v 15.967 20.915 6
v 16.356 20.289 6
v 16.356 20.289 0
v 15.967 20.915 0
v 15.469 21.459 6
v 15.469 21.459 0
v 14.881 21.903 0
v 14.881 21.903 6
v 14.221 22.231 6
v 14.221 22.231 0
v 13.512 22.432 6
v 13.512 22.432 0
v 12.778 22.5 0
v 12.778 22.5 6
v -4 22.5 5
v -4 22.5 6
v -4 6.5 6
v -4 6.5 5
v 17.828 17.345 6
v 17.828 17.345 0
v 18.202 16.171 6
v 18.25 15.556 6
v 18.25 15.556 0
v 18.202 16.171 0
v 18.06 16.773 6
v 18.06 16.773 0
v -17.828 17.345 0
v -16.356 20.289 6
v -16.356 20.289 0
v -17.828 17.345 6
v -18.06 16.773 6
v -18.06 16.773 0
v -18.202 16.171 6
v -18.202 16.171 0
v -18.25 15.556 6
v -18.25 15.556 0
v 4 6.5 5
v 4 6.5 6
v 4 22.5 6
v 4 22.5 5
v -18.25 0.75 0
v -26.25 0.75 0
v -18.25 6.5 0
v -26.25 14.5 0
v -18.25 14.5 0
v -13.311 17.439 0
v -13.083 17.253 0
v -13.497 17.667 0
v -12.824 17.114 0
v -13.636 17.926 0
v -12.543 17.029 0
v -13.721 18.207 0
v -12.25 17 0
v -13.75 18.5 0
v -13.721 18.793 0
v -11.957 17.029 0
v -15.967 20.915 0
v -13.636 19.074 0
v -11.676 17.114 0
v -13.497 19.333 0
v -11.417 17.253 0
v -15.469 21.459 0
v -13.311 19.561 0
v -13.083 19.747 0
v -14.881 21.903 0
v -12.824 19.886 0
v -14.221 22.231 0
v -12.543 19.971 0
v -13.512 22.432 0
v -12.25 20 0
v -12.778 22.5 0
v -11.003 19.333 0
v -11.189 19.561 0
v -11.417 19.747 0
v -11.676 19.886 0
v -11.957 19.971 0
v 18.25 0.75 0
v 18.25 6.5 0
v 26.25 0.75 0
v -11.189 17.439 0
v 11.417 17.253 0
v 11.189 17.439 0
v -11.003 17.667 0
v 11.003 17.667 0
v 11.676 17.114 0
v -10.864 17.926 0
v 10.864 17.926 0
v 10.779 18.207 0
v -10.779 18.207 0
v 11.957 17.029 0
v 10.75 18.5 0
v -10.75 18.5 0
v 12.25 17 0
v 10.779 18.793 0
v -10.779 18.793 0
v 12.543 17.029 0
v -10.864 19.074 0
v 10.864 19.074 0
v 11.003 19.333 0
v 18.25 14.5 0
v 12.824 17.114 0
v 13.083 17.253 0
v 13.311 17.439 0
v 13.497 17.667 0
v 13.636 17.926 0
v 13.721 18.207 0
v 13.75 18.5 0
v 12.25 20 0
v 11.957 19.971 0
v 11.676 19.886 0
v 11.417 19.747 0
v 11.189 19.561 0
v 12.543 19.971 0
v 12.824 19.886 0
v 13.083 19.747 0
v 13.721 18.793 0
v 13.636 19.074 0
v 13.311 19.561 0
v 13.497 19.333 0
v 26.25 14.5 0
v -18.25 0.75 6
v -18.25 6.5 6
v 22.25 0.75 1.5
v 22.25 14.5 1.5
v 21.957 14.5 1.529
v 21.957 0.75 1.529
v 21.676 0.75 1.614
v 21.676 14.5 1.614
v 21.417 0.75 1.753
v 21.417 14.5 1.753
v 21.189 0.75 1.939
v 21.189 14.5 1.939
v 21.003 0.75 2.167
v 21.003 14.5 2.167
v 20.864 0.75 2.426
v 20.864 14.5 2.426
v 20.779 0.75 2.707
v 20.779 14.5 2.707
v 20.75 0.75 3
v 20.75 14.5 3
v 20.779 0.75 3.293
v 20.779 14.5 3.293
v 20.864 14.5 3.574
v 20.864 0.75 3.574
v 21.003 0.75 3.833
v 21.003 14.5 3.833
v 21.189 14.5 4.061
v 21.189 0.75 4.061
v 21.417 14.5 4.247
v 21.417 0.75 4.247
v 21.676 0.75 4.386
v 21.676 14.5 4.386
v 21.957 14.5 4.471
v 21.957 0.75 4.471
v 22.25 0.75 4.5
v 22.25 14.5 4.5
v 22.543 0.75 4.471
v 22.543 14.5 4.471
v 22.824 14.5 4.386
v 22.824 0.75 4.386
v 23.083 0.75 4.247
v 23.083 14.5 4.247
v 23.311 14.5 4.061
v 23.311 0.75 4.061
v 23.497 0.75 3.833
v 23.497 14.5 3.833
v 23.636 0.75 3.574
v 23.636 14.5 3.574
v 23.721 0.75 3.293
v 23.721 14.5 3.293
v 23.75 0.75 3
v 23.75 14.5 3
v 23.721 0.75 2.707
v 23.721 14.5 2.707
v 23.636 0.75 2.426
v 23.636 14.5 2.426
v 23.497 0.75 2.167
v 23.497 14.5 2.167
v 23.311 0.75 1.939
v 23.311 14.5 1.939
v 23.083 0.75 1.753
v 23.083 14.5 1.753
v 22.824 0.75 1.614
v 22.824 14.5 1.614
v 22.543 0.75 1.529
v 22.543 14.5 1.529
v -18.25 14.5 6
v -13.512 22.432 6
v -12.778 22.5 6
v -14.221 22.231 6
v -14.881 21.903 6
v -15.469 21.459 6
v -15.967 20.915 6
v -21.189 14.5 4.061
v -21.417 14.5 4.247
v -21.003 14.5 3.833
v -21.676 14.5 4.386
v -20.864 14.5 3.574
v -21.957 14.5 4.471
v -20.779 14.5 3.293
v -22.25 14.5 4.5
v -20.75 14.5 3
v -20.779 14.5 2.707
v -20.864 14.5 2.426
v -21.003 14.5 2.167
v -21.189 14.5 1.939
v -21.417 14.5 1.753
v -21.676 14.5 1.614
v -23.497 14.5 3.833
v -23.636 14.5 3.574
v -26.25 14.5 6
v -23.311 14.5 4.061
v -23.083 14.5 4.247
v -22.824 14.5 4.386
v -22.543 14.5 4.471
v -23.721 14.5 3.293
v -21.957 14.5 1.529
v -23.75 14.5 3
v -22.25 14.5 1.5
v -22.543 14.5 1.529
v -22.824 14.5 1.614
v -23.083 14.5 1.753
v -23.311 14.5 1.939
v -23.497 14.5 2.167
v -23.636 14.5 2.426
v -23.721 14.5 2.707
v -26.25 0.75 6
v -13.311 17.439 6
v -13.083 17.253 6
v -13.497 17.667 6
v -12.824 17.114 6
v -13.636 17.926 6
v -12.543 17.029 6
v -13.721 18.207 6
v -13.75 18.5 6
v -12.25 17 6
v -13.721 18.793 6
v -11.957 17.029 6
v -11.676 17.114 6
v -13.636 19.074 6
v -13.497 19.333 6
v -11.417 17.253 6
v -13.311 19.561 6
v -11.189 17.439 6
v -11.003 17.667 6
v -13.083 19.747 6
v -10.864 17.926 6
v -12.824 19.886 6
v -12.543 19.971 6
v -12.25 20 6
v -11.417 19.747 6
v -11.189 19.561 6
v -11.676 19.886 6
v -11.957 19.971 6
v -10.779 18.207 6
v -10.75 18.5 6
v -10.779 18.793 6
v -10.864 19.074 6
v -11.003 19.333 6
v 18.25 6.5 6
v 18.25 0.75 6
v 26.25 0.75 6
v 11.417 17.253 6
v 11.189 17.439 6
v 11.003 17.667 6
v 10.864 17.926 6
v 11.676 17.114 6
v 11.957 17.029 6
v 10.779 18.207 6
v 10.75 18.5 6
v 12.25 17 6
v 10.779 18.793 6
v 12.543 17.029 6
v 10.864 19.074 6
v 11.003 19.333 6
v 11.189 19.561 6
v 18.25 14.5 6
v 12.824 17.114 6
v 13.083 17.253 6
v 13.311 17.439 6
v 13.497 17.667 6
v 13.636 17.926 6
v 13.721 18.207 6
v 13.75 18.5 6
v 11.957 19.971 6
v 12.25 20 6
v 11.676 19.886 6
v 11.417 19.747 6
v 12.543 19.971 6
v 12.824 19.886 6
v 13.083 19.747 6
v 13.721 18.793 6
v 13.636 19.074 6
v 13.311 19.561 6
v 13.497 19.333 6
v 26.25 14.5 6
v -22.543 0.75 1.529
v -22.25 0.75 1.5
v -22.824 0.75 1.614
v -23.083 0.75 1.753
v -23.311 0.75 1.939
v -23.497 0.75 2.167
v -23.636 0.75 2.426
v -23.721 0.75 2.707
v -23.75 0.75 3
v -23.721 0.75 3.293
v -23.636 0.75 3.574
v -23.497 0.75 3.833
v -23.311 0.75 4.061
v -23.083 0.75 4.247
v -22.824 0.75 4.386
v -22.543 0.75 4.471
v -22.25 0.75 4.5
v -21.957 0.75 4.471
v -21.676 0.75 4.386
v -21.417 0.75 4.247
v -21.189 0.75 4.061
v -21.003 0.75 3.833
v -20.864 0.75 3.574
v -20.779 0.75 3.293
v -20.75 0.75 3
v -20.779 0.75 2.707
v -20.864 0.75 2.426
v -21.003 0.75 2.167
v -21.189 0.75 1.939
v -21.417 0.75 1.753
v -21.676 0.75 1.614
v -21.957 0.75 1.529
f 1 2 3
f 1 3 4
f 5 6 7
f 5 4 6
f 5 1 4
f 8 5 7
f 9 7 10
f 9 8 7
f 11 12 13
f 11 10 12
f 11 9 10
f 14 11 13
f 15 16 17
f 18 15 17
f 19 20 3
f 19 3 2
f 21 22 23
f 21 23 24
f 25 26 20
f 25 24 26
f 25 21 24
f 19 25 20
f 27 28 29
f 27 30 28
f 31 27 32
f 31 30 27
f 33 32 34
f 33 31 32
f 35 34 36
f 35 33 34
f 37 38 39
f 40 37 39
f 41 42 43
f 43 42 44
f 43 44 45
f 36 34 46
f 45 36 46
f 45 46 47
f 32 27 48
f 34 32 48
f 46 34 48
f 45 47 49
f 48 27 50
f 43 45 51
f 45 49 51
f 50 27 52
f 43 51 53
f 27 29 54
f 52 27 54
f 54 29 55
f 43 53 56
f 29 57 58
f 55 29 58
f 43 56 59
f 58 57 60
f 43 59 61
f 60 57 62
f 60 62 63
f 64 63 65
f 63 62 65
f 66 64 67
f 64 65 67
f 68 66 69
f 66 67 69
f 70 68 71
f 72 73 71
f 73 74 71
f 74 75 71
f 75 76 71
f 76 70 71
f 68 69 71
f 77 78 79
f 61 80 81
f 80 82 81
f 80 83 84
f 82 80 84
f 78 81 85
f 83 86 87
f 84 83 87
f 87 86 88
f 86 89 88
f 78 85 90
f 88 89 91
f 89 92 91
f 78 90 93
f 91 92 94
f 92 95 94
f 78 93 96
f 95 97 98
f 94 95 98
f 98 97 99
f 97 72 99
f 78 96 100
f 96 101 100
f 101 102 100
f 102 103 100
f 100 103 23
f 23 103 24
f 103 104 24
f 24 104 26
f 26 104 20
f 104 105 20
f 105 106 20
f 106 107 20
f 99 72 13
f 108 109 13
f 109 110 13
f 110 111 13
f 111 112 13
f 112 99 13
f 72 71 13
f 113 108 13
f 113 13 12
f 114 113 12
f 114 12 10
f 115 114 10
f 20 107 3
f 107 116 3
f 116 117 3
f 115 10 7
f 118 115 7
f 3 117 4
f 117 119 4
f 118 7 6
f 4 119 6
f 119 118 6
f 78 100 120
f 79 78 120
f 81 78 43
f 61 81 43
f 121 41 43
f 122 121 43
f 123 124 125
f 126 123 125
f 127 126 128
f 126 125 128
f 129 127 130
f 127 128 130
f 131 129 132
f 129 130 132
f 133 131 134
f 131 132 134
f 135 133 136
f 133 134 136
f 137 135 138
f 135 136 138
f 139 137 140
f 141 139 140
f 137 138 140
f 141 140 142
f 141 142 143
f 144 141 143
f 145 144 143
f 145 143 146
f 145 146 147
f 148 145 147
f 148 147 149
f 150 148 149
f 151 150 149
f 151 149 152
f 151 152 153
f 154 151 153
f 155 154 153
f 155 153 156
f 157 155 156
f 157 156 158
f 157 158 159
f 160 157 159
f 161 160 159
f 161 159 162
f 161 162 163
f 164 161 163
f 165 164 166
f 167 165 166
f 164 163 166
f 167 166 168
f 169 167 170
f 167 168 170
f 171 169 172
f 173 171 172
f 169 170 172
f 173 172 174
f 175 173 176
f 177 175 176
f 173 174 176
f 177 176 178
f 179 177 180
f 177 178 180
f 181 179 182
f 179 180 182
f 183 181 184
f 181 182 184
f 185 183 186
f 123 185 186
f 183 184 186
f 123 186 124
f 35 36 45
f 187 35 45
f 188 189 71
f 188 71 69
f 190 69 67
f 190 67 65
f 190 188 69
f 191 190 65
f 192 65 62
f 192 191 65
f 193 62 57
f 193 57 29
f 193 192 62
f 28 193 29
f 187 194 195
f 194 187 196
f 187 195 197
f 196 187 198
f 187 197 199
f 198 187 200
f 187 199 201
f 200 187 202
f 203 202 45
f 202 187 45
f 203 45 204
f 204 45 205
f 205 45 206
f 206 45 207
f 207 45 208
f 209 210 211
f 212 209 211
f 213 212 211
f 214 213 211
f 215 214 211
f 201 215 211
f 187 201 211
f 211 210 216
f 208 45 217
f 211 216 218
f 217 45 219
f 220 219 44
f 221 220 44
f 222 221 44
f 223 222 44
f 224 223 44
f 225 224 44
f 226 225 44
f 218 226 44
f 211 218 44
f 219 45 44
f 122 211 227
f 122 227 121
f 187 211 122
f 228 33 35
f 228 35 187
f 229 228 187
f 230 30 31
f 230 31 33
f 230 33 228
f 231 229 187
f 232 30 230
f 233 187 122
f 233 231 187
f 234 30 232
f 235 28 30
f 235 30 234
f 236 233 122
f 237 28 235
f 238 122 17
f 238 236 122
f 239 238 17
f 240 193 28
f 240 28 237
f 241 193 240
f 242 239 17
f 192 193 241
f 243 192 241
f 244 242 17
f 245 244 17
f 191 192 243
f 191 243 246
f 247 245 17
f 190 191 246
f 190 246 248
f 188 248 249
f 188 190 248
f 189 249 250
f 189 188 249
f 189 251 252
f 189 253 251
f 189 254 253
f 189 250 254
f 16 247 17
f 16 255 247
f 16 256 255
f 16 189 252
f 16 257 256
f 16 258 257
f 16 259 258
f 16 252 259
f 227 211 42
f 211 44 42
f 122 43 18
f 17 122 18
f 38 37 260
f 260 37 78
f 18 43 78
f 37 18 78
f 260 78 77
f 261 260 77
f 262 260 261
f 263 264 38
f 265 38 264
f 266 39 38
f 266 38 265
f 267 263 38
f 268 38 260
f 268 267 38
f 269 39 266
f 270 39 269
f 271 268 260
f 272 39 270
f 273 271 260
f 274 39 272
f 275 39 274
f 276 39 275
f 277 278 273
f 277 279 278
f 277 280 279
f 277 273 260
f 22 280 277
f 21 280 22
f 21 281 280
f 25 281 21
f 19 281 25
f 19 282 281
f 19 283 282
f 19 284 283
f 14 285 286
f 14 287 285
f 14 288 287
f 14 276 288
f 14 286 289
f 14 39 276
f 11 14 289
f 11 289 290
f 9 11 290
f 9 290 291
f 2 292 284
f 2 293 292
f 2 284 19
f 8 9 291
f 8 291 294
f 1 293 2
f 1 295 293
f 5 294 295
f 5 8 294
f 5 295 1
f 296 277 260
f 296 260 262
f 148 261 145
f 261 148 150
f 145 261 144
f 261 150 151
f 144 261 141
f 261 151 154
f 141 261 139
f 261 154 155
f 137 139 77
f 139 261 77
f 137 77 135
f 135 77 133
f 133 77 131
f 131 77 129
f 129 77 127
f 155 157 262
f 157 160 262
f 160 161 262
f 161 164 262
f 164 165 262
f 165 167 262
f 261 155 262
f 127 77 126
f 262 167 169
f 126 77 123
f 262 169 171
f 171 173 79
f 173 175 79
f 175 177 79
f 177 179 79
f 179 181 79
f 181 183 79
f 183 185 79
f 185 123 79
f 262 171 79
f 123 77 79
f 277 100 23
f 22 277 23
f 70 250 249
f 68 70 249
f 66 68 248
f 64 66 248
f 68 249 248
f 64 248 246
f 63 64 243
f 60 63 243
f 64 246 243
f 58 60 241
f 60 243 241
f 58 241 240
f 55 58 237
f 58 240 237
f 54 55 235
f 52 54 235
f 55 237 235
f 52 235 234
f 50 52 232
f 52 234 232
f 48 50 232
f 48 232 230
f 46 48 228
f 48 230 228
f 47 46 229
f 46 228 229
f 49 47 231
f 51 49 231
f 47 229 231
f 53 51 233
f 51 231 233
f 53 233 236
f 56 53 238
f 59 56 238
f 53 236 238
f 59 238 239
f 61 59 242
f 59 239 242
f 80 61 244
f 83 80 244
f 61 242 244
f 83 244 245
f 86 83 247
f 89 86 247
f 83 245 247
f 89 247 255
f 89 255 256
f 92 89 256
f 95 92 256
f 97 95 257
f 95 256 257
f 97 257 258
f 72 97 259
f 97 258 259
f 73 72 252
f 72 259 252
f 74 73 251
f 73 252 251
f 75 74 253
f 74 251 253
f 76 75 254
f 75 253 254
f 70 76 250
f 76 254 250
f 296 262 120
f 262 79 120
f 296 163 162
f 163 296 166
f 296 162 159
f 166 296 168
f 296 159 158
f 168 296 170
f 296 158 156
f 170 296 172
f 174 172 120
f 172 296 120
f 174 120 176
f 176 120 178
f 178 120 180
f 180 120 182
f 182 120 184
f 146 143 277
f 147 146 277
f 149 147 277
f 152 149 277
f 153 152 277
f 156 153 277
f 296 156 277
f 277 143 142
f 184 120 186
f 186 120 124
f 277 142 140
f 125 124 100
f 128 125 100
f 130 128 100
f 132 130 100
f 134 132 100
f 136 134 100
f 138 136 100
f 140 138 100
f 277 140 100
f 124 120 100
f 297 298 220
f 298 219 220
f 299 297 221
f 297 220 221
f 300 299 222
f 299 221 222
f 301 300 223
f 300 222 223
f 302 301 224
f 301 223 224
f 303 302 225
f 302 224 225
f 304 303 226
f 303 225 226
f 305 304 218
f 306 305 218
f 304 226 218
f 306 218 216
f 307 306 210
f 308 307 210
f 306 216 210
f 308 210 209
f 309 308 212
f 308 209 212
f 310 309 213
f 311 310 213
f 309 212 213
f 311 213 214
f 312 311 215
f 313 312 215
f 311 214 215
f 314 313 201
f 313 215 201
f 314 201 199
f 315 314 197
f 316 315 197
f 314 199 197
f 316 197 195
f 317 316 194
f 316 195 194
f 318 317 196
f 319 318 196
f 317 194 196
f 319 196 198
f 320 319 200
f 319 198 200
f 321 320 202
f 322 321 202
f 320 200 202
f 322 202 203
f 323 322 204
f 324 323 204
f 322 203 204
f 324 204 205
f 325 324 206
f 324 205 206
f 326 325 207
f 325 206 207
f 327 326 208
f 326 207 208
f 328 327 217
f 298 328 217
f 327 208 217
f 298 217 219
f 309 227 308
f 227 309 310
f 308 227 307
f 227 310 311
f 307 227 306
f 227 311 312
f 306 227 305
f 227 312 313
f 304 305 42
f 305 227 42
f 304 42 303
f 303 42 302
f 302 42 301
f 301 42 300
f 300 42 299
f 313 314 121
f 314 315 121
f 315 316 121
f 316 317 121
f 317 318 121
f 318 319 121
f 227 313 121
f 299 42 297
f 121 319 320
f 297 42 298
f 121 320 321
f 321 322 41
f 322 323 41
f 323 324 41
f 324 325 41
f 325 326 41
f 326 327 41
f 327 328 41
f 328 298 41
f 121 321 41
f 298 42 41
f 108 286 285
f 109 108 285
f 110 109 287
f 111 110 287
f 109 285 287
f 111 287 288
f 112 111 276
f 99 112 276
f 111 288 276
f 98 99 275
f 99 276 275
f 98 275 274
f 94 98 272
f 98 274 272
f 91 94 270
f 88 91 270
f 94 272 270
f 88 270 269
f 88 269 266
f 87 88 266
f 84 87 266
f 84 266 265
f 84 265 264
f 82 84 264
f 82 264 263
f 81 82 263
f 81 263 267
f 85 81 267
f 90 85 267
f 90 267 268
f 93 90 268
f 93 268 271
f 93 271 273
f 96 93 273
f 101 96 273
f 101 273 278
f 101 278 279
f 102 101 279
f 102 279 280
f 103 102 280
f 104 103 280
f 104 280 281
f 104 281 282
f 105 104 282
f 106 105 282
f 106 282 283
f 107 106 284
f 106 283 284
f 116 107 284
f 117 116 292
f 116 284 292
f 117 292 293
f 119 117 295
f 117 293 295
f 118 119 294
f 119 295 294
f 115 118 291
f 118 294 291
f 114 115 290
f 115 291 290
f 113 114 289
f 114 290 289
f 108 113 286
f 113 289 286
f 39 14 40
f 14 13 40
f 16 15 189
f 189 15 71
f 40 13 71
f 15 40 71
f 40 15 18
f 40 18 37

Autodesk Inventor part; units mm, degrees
ref_plane "YZ Plane" through (0, 0, 0) normal (1, 0, 0) x (0, 1, 0)
ref_plane "XZ Plane" through (0, 0, 0) normal (0, 1, 0) x (-1, 0, 0)
ref_plane "XY Plane" through (0, 0, 0) normal (0, 0, 1) x (1, 0, 0)
sketch "Sketch1" plane through (0, 0, 0) normal (0, 0, 1) x (1, 0, 0)
  line L0 (-18.25, 6.5) -> (18.25, 6.5)
  line L1 (18.25, 6.5) -> (18.25, -6.5)
  line L2 (18.25, -6.5) -> (-18.25, -6.5)
  line L3 (-18.25, -6.5) -> (-18.25, 6.5)
  line L4 (26.25, 14.5) -> (-26.25, 14.5)
  line L5 (-26.25, 14.5) -> (-26.25, -14.5)
  line L6 (-26.25, -14.5) -> (26.25, -14.5)
  line L7 (26.25, -14.5) -> (26.25, 14.5)
  line L8 (-26.25, 0.75) -> (-18.25, 0.75)
  line L9 (18.25, 0.75) -> (26.25, 0.75)
  point P0 (0, 0)
  dimension "d0" = 36.5
  dimension "d1" = 13
  dimension "d2" = 8
  dimension "d3" = 18.25
  dimension "d4" = 6.5
  dimension "d5" = 0.75
  dimension "d6" = 0.75
extrude "Extrusion1" add sketch "Sketch1" along normal blind 6 contours L3 L8 L5 L4 L7 L9 L1 L0
sketch "Sketch2" plane through (18.25, 0.75, 0) normal (0, -1, 0) x (1, 0, 0)
  line L0 (-44.5, 0) -> (-36.5, 0) projected
  line L1 (-36.5, 0) -> (-36.5, 6) projected
  line L2 (-44.5, 6) -> (-36.5, 6) projected
  line L3 (-44.5, 0) -> (-44.5, 6) projected
  line L4 (0, 0) -> (8, 0) projected
  line L5 (8, 0) -> (8, 6) projected
  line L6 (0, 6) -> (8, 6) projected
  line L7 (0, 0) -> (0, 6) projected
  point P0 (-18.25, 0)
  point P1 (-40.5, 3)
  point P2 (4, 3)
  dimension "d9" = 8
  dimension "d10" = 6
  dimension "d11" = 3
  dimension "d12" = 4
  dimension "d13" = 4
  dimension "d14" = 3
hole "Hole1" at (-22.25, 0.75, 3) at (22.25, 0.75, 3) direction (0, 1, 0) diameter 3 end through all
sketch "Sketch3" plane through (0, 0, 0) normal (0, 0, -1) x (-1, 0, 0)
  line L0 (18.25, 6.5) -> (-18.25, 6.5) projected
  line L1 (18.25, 0.75) -> (18.25, 6.5) projected
  line L2 (26.25, 0.75) -> (18.25, 0.75) projected
  line L3 (26.25, 14.5) -> (26.25, 0.75) projected
  line L4 (-26.25, 14.5) -> (26.25, 14.5) projected
  line L5 (-26.25, 0.75) -> (-26.25, 14.5) projected
  line L6 (-18.25, 0.75) -> (-26.25, 0.75) projected
  line L7 (-18.25, 6.5) -> (-18.25, 0.75) projected
  line L8 (-26.25, 14.5) -> (26.25, 14.5) projected
  line L9 (18.25, 14.5) -> (-18.25, 14.5)
  line L10 (-18.25, 14.5) -> (-18.25, 22.5)
  line L11 (-18.25, 22.5) -> (18.25, 22.5)
  line L12 (18.25, 22.5) -> (18.25, 14.5)
  point P0 (0, 0)
  point P1 (12.25, 18.5)
  point P2 (-12.25, 18.5)
  dimension "d22" = 36.5
  dimension "d23" = 8
  dimension "d24" = 8
  dimension "d25" = 6
  dimension "d26" = 6
  dimension "d27" = 4
  dimension "d28" = 4
extrude "Extrusion2" add sketch "Sketch3" against normal blind 6 contours L4 L10 L11 L12
hole "Hole2" at (-12.25, 18.5, 0) at (12.25, 18.5, 0) direction (0, 0, 1) diameter 3 end through all
chamfer "Chamfer1" distance 3 distance2 6 1 edges at (-18.25, 22.5, 3) measured on face at (-6.0833, 22.5, 2)
chamfer "Chamfer2" distance 3 distance2 6 1 edges at (18.25, 22.5, 3) measured on face at (-4.0833, 22.5, 2)
fillet "Fillet1" radius 4 4 edges at (18.25, 16.5, 3) (15.25, 22.5, 3) (-15.25, 22.5, 3) (-18.25, 16.5, 3)
sketch "Sketch4" plane through (0, 0, 6) normal (0, 0, 1) x (1, 0, 0)
  circle A0 centre (12.25, 18.5) radius 1.5 projected
  circle A1 centre (-12.25, 18.5) radius 1.5 projected
  arc A2 (-17.8277, 17.3446) -> (-18.25, 15.5557) centre (-14.25, 15.5557) ccw projected
  line L0 (-18.25, 15.5557) -> (-18.25, 14.5) projected
  line L1 (-18.25, 14.5) -> (-26.25, 14.5) projected
  line L2 (-26.25, 14.5) -> (-26.25, 0.75) projected
  line L3 (-26.25, 0.75) -> (-18.25, 0.75) projected
  line L4 (-18.25, 0.75) -> (-18.25, 6.5) projected
  line L5 (-18.25, 6.5) -> (18.25, 6.5) projected
  line L6 (18.25, 6.5) -> (18.25, 0.75) projected
  line L7 (18.25, 0.75) -> (26.25, 0.75) projected
  line L8 (26.25, 0.75) -> (26.25, 14.5) projected
  line L9 (26.25, 14.5) -> (18.25, 14.5) projected
  line L10 (18.25, 14.5) -> (18.25, 15.5557) projected
  arc A3 (18.25, 15.5557) -> (17.8277, 17.3446) centre (14.25, 15.5557) ccw projected
  line L11 (16.3556, 20.2889) -> (17.8277, 17.3446) projected
  arc A4 (16.3556, 20.2889) -> (12.7779, 22.5) centre (12.7779, 18.5) ccw projected
  line L12 (12.7779, 22.5) -> (-12.7779, 22.5) projected
  arc A5 (-12.7779, 22.5) -> (-16.3556, 20.2889) centre (-12.7779, 18.5) ccw projected
  line L13 (-17.8277, 17.3446) -> (-16.3556, 20.2889) projected
  line L14 (-18.25, 6.5) -> (18.25, 6.5) projected
  line L15 (-4, 6.5) -> (4, 6.5)
  line L16 (4, 6.5) -> (4, 22.5)
  line L17 (4, 22.5) -> (-4, 22.5)
  line L18 (-4, 22.5) -> (-4, 6.5)
  point P0 (0, 0)
  dimension "d45" = 8
  dimension "d46" = 16
  dimension "d47" = 36.5
  dimension "d48" = 14.25
  dimension "d51" = 16
extrude "Extrusion3" cut sketch "Sketch4" against normal blind 1 contours L12 L16 L5 L18
equation "\"d3\" = 0.5 * d0"
equation "\"d4\" = 0.5 * d1"
equation "\"d6\" = d5"
equation "\"d11\" = 0.5 * d10"
equation "\"d12\" = 0.5 * d9"
equation "\"d13\" = d12"
equation "\"d14\" = d11"
equation "\"d27\" = 0.5 * d24"
equation "\"d28\" = d27"
equation "\"d46\" = d51"
equation "\"d48\" = -0.5 * d45 + 0.5 * d47"
properties part number "3DP_ABS_Electromagnet_Clamps" material "ABS Plastic"
